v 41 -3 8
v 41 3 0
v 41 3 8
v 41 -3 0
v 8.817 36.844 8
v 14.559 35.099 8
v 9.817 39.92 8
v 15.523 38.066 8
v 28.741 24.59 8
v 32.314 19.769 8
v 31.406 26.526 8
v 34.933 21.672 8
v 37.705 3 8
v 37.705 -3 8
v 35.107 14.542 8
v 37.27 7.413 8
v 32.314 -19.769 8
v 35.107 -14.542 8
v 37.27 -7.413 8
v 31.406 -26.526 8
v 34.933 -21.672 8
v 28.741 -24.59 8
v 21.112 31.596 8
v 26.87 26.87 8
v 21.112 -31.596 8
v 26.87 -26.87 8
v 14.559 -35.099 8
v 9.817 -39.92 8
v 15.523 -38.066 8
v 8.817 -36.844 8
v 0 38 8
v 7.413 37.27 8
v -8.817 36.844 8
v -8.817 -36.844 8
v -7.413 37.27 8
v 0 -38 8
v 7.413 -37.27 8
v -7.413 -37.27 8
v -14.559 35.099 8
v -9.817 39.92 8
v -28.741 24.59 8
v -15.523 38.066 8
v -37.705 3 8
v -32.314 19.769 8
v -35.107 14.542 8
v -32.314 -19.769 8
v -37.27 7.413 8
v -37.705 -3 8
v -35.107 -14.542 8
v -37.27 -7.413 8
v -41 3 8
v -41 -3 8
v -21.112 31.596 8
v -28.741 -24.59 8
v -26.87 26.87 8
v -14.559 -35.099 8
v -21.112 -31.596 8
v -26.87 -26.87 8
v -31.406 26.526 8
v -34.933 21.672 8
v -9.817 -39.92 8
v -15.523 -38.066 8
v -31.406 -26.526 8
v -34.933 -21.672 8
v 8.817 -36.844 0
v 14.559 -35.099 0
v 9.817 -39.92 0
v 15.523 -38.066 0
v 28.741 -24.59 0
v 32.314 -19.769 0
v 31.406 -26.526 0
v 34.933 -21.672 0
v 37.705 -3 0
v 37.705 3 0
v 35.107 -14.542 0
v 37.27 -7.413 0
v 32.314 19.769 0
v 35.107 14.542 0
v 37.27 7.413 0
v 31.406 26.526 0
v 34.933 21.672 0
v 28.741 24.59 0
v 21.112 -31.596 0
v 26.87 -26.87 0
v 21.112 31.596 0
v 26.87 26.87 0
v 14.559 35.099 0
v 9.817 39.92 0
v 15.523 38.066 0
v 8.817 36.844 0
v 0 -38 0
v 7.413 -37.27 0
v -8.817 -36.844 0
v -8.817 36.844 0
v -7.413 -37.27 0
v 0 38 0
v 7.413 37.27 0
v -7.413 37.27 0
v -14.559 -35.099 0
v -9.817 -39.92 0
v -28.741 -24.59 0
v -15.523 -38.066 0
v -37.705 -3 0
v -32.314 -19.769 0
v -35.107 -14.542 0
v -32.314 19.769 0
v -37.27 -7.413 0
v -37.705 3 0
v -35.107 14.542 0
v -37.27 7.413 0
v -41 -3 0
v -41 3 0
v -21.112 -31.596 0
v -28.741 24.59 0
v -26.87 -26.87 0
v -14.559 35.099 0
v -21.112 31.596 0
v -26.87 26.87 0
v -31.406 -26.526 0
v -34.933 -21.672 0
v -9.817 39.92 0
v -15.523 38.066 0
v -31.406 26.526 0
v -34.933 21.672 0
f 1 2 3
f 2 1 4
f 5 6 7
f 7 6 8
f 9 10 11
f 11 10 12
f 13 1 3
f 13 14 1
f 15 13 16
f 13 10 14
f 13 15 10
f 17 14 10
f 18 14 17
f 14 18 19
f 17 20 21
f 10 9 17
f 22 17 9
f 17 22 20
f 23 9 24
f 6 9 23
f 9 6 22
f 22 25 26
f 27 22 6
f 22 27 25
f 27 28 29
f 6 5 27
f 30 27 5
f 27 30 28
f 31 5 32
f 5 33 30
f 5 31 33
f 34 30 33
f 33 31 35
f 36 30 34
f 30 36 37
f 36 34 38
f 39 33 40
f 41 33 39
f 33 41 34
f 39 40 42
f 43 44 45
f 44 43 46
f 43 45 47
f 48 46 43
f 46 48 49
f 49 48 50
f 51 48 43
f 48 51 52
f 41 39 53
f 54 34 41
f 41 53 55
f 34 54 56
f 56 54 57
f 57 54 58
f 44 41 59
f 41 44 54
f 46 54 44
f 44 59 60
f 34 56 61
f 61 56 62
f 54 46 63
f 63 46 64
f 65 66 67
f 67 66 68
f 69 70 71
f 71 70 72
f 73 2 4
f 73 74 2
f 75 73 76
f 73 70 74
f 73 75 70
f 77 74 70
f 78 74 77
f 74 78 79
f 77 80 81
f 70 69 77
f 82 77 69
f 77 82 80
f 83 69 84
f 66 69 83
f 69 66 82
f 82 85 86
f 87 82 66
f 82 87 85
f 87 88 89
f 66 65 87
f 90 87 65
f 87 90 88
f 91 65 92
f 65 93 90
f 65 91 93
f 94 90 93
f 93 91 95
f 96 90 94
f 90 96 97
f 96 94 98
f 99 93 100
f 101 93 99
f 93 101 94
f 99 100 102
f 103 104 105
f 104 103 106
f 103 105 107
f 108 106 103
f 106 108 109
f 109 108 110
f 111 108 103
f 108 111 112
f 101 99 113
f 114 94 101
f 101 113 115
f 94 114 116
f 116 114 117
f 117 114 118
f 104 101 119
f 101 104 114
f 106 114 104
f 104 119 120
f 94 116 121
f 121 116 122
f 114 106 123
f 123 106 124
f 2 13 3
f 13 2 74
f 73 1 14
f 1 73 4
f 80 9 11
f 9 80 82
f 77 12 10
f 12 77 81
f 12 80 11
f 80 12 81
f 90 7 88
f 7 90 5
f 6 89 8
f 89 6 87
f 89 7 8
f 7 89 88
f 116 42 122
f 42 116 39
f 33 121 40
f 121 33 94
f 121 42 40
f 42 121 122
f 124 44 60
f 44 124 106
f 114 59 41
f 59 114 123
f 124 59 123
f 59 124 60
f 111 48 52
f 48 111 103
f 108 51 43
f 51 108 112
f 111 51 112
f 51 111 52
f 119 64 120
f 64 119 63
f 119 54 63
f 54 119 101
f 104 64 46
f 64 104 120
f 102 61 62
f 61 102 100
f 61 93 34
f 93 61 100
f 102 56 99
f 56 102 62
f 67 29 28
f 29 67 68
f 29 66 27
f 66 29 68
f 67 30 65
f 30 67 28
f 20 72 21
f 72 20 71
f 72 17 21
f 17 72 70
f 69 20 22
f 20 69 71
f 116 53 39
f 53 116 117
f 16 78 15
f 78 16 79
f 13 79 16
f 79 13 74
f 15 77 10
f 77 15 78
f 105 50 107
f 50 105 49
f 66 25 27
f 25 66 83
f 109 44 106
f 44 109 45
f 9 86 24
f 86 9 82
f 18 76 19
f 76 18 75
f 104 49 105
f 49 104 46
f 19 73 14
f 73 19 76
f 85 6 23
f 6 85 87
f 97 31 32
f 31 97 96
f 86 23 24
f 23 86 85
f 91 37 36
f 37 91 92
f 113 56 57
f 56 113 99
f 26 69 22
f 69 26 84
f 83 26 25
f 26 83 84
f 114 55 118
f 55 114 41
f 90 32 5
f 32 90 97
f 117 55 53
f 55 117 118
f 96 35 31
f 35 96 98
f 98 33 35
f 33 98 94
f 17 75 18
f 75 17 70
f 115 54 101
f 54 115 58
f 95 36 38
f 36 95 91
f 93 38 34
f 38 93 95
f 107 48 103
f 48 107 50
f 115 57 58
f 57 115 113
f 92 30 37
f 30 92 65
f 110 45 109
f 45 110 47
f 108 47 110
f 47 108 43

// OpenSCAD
$fn = 32;

// ----------------------------------------------------------------------
// Spur blank: plain gear blank
// ----------------------------------------------------------------------

// --- parameters (mm) ---
disc_r = 38;              // blank root radius
disc_t = 8;               // blank thickness
n_teeth = 10;             // stub tooth count
tooth_w = 6;              // tooth width at the root
tooth_h = 3;              // tooth height above the root

out_r = disc_r + tooth_h;  // tip radius
bbox_x = 82.0;  // measured width over the teeth
bbox_y = 79.84;  // measured depth over the teeth

union() {
  cylinder(r = disc_r, h = disc_t);
  for (i = [0 : n_teeth - 1])
    rotate([0, 0, i * 360 / n_teeth])
      translate([disc_r - 1, -tooth_w / 2, 0])
        cube([tooth_h + 1, tooth_w, disc_t]);
}
